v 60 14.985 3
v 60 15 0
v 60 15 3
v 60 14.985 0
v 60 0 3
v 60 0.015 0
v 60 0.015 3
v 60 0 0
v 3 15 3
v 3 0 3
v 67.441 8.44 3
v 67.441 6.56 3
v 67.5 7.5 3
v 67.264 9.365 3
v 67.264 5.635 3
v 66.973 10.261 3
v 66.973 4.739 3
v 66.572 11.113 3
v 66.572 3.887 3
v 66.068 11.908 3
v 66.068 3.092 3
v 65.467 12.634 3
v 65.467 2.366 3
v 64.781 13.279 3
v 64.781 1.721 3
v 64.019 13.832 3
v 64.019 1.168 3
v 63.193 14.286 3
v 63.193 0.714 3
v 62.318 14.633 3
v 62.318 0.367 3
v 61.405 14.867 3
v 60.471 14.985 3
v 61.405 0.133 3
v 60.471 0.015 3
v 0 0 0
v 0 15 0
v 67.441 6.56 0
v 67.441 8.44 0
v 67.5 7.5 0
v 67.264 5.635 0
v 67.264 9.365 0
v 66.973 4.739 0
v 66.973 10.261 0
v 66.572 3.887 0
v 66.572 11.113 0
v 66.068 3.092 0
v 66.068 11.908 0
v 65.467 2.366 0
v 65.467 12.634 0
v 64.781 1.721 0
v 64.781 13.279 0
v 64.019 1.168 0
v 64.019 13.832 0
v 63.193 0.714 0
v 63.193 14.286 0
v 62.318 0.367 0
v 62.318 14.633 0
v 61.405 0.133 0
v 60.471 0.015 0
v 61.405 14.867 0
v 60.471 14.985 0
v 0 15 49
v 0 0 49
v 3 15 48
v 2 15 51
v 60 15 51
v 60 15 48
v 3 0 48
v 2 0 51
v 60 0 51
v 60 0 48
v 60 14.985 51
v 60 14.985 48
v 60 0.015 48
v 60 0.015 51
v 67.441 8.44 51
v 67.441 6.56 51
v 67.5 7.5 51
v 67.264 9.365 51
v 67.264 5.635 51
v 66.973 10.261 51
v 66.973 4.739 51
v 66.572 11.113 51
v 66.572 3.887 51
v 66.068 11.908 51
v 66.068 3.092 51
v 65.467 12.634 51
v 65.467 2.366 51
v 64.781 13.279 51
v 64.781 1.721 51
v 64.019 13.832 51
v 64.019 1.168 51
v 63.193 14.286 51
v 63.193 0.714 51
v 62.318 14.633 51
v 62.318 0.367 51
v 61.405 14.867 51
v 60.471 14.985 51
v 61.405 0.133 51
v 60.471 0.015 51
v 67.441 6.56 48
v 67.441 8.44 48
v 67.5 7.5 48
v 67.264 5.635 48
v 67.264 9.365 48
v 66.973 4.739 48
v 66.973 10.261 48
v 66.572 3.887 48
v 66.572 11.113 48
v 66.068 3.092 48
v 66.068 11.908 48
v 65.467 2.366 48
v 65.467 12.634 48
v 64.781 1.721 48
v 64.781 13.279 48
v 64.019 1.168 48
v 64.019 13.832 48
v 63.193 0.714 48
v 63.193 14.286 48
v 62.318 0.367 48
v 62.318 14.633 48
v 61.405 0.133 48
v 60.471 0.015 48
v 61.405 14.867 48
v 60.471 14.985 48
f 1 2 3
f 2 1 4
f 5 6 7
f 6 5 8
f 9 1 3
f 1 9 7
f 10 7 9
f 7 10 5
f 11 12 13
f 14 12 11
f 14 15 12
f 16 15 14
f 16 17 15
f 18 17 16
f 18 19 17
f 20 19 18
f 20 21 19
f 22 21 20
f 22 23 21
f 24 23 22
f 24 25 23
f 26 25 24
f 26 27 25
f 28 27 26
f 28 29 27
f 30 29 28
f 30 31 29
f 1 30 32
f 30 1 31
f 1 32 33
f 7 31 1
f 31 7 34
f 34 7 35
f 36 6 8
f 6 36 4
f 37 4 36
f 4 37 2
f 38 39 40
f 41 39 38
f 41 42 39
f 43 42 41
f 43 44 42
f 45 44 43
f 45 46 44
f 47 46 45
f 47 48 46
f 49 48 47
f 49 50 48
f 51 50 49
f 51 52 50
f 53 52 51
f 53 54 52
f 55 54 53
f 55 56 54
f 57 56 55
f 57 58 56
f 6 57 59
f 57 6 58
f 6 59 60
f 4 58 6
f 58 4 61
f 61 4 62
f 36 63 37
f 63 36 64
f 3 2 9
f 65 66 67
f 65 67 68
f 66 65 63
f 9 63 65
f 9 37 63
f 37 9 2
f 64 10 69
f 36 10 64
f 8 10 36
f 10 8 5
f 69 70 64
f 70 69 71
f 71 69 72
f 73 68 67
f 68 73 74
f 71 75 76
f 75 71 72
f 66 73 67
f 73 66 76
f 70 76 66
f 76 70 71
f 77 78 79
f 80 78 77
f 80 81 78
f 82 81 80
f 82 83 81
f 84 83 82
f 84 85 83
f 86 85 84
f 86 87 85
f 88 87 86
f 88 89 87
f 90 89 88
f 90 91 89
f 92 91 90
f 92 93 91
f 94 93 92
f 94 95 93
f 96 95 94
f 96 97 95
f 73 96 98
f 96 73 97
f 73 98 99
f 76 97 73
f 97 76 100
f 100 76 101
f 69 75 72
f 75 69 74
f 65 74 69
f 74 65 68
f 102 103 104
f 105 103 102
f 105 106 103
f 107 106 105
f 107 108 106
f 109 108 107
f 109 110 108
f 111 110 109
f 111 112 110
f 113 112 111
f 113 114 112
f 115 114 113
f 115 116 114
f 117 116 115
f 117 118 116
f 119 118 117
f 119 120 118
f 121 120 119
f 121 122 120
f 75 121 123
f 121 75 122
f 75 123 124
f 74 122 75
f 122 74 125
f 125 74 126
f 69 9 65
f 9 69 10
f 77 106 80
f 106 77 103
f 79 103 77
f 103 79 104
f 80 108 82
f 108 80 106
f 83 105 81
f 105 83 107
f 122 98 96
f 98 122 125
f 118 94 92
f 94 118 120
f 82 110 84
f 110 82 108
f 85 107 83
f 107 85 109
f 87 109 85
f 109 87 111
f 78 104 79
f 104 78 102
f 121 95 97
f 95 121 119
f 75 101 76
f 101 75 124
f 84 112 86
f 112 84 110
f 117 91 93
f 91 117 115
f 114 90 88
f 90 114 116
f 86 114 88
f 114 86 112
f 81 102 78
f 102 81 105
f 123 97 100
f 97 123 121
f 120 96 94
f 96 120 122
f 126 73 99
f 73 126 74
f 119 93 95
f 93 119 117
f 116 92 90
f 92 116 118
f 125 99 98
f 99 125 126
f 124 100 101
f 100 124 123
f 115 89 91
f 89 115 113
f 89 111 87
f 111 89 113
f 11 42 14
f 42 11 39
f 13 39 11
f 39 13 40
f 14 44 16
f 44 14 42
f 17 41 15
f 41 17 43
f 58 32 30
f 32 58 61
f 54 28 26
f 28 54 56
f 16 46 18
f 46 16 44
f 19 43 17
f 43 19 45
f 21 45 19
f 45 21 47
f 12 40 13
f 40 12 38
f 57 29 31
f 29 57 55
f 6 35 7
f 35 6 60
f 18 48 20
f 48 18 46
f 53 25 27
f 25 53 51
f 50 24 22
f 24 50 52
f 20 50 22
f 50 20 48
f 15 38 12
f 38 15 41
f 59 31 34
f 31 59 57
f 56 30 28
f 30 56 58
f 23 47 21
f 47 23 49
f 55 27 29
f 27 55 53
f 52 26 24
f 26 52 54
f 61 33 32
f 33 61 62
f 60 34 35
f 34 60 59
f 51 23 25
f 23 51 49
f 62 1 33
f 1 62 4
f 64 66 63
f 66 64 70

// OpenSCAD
thickness = 3;
height = 45;
length = 60;
width = 15;



difference(){
        union(){cube([length,width,thickness]);
translate([0,0,height+thickness]) cube([length,width,thickness]);
cube([thickness,width,height+2*thickness]);
translate([length,width/2,height+thickness]) cylinder(r1=width/2, r2=width/2, h=thickness);
$fn=50;
translate([length,width/2,0]) cylinder(r1=width/2, r2=width/2, h=thickness);
}
        translate([0,0,height+thickness+1]) rotate(a=-45, v=[0,1,0]) cube([50,width,thickness]);
        translate([-7.5,0,1]) rotate(a=45, v=[0,1,0]) cube([50,width,thickness]);
}
